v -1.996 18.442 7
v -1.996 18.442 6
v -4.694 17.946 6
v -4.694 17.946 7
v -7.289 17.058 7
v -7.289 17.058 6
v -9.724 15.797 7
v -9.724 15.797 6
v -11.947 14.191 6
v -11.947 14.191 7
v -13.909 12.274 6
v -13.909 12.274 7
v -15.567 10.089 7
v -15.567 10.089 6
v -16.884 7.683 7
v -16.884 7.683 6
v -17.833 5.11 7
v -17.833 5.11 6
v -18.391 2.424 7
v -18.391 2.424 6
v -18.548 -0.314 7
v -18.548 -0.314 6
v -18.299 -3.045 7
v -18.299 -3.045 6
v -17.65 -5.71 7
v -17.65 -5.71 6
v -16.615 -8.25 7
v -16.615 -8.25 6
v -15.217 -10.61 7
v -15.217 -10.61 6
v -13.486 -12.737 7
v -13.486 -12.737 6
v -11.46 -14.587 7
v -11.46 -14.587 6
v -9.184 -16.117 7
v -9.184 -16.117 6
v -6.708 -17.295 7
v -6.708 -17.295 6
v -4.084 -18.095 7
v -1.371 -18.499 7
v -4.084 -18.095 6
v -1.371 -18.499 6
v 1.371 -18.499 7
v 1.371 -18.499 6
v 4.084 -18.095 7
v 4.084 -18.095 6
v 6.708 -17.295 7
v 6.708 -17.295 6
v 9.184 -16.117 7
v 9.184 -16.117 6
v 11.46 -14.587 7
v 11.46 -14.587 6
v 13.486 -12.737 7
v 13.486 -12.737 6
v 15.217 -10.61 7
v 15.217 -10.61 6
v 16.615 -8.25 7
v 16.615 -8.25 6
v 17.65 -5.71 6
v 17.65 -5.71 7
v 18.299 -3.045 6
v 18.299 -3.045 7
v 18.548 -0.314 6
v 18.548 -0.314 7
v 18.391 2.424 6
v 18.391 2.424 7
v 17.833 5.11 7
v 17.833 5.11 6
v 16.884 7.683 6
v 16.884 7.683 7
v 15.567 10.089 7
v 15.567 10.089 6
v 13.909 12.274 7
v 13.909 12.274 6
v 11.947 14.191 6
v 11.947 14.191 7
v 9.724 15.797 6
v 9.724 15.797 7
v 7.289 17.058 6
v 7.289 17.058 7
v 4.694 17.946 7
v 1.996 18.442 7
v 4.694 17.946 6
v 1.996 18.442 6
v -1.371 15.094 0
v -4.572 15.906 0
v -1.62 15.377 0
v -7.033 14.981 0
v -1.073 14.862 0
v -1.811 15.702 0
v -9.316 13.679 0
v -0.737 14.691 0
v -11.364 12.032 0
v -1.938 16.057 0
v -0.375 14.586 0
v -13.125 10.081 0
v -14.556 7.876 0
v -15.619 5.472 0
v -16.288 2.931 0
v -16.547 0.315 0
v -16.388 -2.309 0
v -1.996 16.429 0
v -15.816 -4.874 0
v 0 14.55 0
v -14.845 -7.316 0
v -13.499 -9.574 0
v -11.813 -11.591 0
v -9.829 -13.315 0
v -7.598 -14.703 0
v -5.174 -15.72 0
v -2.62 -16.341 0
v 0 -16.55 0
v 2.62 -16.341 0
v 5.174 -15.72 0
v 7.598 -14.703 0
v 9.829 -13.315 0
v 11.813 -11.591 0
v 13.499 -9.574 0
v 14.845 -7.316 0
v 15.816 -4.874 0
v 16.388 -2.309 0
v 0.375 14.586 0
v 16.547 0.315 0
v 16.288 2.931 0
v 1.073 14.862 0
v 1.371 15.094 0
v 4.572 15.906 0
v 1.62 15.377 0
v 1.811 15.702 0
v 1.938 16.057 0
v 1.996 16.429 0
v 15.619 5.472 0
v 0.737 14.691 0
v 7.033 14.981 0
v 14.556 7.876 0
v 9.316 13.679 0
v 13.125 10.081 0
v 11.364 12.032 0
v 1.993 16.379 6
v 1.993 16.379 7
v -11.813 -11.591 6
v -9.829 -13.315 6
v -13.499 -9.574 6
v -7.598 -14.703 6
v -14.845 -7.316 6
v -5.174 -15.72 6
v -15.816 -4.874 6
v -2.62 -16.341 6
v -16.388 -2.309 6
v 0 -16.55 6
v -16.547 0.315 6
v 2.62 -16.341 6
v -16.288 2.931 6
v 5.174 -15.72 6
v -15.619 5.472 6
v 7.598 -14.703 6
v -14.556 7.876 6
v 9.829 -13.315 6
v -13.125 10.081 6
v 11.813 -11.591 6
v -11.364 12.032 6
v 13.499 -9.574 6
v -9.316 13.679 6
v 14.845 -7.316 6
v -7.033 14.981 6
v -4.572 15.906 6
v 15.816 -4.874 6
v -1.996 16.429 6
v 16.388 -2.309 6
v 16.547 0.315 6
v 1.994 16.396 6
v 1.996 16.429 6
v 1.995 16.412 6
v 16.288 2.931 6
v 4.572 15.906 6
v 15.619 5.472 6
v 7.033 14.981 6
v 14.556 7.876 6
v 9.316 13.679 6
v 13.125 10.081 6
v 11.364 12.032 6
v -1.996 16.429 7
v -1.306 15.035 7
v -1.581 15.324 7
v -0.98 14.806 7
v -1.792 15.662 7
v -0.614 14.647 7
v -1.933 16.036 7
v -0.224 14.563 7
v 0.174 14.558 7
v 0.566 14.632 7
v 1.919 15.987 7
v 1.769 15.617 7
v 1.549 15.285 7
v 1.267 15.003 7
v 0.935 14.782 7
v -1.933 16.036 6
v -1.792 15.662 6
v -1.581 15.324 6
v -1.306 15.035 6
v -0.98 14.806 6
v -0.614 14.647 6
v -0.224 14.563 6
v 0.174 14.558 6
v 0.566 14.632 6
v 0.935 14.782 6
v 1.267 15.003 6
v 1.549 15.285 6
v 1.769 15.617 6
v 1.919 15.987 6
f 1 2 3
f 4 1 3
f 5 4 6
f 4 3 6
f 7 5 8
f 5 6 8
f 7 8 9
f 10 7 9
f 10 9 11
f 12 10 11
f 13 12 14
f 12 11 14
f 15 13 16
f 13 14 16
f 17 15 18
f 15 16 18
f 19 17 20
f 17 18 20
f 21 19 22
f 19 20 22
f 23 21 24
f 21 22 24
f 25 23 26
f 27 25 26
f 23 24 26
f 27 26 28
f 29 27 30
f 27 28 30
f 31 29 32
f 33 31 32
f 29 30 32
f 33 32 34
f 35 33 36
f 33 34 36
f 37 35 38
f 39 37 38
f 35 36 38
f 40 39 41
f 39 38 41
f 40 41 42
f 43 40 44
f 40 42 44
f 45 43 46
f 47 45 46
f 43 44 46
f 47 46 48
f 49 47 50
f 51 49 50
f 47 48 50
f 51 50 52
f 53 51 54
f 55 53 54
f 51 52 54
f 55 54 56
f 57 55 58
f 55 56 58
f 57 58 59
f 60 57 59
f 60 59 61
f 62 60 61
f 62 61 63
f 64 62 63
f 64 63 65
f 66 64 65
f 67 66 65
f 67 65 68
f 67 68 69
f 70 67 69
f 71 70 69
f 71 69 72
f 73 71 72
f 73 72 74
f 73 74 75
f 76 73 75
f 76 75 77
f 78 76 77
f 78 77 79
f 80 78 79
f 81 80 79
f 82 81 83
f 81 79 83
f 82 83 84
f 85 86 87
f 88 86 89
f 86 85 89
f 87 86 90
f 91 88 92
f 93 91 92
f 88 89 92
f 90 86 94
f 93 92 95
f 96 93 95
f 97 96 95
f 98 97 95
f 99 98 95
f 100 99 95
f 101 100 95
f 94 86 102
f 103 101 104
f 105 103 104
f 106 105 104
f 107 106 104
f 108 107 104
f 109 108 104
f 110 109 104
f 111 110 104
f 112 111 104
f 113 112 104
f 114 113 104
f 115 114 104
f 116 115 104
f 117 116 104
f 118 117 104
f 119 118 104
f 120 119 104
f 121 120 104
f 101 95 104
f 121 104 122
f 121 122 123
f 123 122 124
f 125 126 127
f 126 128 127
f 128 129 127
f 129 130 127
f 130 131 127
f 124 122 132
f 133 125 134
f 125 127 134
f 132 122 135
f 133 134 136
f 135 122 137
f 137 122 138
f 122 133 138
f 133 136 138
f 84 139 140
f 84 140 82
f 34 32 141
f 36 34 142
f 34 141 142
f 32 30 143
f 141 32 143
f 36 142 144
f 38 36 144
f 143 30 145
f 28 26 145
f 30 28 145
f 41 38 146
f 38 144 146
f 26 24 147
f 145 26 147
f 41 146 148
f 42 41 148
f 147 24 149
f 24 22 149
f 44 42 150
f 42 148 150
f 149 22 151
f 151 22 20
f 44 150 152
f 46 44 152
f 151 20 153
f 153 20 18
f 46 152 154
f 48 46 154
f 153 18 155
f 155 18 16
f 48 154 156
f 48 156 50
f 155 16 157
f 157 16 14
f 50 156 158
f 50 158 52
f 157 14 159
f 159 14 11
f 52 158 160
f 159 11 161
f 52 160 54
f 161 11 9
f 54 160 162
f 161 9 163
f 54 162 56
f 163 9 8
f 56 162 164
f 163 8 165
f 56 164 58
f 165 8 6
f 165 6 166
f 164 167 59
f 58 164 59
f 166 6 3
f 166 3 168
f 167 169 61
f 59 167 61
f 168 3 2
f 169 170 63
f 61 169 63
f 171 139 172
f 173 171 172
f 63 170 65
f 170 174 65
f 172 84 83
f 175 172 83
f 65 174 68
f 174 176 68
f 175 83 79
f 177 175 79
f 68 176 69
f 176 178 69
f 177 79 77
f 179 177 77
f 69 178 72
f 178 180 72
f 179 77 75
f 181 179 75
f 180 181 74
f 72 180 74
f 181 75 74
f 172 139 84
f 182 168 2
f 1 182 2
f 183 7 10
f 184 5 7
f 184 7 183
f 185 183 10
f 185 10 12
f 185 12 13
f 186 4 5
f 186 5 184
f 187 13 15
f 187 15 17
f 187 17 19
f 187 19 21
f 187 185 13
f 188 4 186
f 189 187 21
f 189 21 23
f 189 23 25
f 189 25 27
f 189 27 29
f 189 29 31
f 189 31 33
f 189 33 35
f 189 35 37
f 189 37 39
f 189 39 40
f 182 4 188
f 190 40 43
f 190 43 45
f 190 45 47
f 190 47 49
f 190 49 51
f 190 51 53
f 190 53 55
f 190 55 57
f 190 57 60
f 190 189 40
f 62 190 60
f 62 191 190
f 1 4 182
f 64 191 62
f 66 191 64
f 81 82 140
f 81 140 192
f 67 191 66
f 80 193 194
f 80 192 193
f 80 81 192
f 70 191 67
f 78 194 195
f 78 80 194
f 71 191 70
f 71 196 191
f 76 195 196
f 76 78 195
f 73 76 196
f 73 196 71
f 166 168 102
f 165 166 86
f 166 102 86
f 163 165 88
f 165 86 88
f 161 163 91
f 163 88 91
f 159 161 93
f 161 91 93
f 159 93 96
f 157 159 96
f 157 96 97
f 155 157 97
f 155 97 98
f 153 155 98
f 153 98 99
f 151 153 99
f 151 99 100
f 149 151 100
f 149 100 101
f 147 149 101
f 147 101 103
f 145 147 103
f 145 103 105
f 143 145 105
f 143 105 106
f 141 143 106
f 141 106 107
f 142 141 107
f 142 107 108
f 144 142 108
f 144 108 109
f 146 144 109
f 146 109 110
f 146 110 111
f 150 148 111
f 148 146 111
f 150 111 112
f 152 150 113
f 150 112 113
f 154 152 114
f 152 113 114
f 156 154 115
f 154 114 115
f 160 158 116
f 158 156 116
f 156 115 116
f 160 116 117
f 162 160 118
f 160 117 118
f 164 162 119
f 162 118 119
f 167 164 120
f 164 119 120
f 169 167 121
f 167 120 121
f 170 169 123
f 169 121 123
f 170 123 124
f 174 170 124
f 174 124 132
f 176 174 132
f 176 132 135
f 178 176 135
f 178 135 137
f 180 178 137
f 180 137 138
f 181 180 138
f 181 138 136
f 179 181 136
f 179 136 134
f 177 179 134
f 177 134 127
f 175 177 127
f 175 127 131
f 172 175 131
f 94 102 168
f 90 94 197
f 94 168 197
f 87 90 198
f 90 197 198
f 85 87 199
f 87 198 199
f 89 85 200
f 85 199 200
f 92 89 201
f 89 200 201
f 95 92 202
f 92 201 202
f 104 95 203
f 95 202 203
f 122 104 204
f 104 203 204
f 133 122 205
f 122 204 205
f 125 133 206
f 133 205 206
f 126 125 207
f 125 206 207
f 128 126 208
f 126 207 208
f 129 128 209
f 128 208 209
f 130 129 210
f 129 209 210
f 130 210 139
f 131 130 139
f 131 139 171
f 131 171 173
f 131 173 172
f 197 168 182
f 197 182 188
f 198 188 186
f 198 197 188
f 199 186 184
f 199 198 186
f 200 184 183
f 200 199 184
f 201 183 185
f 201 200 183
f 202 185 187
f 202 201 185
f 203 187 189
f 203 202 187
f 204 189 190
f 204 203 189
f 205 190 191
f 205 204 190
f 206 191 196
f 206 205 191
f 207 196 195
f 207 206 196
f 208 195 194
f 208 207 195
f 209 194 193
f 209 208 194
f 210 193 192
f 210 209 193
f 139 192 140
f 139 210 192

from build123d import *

# Parameters (mm, degrees)
SKETCH_R     = 16.55
PAD_DEPTH    = 6
SKETCH001_R  = 2
POCKET_DEPTH = 6.001
PAD001_DEPTH = 1


with BuildPart() as part:
    # Sketch → Pad (new body)
    with BuildSketch(Plane.XY):
        Circle(SKETCH_R)
    extrude(amount=PAD_DEPTH)

    # Sketch001 (on Face3 of Pad) → Pocket (cut, through all)
    with BuildSketch(Plane.XY.offset(6)):
        with Locations((0, 16.55)):
            Circle(SKETCH001_R)
    extrude(amount=-POCKET_DEPTH, mode=Mode.SUBTRACT)

    # Sketch002 (on Face4 of Pocket) → Pad001 (join)
    with BuildSketch(Plane.XY.offset(6)):
        with BuildLine():
            ThreePointArc((-1.996346, 18.442436), (0, -18.550171), (1.996346, 18.442436))
            Line((1.992658, 16.378788), (1.996346, 18.442436))
            ThreePointArc((-1.996346, 16.429154), (-0.025251, 14.550159), (1.992658, 16.378788))
            Line((-1.996346, 16.429154), (-1.996346, 18.442436))
        make_face()
    extrude(amount=PAD001_DEPTH)


solid = part.part
